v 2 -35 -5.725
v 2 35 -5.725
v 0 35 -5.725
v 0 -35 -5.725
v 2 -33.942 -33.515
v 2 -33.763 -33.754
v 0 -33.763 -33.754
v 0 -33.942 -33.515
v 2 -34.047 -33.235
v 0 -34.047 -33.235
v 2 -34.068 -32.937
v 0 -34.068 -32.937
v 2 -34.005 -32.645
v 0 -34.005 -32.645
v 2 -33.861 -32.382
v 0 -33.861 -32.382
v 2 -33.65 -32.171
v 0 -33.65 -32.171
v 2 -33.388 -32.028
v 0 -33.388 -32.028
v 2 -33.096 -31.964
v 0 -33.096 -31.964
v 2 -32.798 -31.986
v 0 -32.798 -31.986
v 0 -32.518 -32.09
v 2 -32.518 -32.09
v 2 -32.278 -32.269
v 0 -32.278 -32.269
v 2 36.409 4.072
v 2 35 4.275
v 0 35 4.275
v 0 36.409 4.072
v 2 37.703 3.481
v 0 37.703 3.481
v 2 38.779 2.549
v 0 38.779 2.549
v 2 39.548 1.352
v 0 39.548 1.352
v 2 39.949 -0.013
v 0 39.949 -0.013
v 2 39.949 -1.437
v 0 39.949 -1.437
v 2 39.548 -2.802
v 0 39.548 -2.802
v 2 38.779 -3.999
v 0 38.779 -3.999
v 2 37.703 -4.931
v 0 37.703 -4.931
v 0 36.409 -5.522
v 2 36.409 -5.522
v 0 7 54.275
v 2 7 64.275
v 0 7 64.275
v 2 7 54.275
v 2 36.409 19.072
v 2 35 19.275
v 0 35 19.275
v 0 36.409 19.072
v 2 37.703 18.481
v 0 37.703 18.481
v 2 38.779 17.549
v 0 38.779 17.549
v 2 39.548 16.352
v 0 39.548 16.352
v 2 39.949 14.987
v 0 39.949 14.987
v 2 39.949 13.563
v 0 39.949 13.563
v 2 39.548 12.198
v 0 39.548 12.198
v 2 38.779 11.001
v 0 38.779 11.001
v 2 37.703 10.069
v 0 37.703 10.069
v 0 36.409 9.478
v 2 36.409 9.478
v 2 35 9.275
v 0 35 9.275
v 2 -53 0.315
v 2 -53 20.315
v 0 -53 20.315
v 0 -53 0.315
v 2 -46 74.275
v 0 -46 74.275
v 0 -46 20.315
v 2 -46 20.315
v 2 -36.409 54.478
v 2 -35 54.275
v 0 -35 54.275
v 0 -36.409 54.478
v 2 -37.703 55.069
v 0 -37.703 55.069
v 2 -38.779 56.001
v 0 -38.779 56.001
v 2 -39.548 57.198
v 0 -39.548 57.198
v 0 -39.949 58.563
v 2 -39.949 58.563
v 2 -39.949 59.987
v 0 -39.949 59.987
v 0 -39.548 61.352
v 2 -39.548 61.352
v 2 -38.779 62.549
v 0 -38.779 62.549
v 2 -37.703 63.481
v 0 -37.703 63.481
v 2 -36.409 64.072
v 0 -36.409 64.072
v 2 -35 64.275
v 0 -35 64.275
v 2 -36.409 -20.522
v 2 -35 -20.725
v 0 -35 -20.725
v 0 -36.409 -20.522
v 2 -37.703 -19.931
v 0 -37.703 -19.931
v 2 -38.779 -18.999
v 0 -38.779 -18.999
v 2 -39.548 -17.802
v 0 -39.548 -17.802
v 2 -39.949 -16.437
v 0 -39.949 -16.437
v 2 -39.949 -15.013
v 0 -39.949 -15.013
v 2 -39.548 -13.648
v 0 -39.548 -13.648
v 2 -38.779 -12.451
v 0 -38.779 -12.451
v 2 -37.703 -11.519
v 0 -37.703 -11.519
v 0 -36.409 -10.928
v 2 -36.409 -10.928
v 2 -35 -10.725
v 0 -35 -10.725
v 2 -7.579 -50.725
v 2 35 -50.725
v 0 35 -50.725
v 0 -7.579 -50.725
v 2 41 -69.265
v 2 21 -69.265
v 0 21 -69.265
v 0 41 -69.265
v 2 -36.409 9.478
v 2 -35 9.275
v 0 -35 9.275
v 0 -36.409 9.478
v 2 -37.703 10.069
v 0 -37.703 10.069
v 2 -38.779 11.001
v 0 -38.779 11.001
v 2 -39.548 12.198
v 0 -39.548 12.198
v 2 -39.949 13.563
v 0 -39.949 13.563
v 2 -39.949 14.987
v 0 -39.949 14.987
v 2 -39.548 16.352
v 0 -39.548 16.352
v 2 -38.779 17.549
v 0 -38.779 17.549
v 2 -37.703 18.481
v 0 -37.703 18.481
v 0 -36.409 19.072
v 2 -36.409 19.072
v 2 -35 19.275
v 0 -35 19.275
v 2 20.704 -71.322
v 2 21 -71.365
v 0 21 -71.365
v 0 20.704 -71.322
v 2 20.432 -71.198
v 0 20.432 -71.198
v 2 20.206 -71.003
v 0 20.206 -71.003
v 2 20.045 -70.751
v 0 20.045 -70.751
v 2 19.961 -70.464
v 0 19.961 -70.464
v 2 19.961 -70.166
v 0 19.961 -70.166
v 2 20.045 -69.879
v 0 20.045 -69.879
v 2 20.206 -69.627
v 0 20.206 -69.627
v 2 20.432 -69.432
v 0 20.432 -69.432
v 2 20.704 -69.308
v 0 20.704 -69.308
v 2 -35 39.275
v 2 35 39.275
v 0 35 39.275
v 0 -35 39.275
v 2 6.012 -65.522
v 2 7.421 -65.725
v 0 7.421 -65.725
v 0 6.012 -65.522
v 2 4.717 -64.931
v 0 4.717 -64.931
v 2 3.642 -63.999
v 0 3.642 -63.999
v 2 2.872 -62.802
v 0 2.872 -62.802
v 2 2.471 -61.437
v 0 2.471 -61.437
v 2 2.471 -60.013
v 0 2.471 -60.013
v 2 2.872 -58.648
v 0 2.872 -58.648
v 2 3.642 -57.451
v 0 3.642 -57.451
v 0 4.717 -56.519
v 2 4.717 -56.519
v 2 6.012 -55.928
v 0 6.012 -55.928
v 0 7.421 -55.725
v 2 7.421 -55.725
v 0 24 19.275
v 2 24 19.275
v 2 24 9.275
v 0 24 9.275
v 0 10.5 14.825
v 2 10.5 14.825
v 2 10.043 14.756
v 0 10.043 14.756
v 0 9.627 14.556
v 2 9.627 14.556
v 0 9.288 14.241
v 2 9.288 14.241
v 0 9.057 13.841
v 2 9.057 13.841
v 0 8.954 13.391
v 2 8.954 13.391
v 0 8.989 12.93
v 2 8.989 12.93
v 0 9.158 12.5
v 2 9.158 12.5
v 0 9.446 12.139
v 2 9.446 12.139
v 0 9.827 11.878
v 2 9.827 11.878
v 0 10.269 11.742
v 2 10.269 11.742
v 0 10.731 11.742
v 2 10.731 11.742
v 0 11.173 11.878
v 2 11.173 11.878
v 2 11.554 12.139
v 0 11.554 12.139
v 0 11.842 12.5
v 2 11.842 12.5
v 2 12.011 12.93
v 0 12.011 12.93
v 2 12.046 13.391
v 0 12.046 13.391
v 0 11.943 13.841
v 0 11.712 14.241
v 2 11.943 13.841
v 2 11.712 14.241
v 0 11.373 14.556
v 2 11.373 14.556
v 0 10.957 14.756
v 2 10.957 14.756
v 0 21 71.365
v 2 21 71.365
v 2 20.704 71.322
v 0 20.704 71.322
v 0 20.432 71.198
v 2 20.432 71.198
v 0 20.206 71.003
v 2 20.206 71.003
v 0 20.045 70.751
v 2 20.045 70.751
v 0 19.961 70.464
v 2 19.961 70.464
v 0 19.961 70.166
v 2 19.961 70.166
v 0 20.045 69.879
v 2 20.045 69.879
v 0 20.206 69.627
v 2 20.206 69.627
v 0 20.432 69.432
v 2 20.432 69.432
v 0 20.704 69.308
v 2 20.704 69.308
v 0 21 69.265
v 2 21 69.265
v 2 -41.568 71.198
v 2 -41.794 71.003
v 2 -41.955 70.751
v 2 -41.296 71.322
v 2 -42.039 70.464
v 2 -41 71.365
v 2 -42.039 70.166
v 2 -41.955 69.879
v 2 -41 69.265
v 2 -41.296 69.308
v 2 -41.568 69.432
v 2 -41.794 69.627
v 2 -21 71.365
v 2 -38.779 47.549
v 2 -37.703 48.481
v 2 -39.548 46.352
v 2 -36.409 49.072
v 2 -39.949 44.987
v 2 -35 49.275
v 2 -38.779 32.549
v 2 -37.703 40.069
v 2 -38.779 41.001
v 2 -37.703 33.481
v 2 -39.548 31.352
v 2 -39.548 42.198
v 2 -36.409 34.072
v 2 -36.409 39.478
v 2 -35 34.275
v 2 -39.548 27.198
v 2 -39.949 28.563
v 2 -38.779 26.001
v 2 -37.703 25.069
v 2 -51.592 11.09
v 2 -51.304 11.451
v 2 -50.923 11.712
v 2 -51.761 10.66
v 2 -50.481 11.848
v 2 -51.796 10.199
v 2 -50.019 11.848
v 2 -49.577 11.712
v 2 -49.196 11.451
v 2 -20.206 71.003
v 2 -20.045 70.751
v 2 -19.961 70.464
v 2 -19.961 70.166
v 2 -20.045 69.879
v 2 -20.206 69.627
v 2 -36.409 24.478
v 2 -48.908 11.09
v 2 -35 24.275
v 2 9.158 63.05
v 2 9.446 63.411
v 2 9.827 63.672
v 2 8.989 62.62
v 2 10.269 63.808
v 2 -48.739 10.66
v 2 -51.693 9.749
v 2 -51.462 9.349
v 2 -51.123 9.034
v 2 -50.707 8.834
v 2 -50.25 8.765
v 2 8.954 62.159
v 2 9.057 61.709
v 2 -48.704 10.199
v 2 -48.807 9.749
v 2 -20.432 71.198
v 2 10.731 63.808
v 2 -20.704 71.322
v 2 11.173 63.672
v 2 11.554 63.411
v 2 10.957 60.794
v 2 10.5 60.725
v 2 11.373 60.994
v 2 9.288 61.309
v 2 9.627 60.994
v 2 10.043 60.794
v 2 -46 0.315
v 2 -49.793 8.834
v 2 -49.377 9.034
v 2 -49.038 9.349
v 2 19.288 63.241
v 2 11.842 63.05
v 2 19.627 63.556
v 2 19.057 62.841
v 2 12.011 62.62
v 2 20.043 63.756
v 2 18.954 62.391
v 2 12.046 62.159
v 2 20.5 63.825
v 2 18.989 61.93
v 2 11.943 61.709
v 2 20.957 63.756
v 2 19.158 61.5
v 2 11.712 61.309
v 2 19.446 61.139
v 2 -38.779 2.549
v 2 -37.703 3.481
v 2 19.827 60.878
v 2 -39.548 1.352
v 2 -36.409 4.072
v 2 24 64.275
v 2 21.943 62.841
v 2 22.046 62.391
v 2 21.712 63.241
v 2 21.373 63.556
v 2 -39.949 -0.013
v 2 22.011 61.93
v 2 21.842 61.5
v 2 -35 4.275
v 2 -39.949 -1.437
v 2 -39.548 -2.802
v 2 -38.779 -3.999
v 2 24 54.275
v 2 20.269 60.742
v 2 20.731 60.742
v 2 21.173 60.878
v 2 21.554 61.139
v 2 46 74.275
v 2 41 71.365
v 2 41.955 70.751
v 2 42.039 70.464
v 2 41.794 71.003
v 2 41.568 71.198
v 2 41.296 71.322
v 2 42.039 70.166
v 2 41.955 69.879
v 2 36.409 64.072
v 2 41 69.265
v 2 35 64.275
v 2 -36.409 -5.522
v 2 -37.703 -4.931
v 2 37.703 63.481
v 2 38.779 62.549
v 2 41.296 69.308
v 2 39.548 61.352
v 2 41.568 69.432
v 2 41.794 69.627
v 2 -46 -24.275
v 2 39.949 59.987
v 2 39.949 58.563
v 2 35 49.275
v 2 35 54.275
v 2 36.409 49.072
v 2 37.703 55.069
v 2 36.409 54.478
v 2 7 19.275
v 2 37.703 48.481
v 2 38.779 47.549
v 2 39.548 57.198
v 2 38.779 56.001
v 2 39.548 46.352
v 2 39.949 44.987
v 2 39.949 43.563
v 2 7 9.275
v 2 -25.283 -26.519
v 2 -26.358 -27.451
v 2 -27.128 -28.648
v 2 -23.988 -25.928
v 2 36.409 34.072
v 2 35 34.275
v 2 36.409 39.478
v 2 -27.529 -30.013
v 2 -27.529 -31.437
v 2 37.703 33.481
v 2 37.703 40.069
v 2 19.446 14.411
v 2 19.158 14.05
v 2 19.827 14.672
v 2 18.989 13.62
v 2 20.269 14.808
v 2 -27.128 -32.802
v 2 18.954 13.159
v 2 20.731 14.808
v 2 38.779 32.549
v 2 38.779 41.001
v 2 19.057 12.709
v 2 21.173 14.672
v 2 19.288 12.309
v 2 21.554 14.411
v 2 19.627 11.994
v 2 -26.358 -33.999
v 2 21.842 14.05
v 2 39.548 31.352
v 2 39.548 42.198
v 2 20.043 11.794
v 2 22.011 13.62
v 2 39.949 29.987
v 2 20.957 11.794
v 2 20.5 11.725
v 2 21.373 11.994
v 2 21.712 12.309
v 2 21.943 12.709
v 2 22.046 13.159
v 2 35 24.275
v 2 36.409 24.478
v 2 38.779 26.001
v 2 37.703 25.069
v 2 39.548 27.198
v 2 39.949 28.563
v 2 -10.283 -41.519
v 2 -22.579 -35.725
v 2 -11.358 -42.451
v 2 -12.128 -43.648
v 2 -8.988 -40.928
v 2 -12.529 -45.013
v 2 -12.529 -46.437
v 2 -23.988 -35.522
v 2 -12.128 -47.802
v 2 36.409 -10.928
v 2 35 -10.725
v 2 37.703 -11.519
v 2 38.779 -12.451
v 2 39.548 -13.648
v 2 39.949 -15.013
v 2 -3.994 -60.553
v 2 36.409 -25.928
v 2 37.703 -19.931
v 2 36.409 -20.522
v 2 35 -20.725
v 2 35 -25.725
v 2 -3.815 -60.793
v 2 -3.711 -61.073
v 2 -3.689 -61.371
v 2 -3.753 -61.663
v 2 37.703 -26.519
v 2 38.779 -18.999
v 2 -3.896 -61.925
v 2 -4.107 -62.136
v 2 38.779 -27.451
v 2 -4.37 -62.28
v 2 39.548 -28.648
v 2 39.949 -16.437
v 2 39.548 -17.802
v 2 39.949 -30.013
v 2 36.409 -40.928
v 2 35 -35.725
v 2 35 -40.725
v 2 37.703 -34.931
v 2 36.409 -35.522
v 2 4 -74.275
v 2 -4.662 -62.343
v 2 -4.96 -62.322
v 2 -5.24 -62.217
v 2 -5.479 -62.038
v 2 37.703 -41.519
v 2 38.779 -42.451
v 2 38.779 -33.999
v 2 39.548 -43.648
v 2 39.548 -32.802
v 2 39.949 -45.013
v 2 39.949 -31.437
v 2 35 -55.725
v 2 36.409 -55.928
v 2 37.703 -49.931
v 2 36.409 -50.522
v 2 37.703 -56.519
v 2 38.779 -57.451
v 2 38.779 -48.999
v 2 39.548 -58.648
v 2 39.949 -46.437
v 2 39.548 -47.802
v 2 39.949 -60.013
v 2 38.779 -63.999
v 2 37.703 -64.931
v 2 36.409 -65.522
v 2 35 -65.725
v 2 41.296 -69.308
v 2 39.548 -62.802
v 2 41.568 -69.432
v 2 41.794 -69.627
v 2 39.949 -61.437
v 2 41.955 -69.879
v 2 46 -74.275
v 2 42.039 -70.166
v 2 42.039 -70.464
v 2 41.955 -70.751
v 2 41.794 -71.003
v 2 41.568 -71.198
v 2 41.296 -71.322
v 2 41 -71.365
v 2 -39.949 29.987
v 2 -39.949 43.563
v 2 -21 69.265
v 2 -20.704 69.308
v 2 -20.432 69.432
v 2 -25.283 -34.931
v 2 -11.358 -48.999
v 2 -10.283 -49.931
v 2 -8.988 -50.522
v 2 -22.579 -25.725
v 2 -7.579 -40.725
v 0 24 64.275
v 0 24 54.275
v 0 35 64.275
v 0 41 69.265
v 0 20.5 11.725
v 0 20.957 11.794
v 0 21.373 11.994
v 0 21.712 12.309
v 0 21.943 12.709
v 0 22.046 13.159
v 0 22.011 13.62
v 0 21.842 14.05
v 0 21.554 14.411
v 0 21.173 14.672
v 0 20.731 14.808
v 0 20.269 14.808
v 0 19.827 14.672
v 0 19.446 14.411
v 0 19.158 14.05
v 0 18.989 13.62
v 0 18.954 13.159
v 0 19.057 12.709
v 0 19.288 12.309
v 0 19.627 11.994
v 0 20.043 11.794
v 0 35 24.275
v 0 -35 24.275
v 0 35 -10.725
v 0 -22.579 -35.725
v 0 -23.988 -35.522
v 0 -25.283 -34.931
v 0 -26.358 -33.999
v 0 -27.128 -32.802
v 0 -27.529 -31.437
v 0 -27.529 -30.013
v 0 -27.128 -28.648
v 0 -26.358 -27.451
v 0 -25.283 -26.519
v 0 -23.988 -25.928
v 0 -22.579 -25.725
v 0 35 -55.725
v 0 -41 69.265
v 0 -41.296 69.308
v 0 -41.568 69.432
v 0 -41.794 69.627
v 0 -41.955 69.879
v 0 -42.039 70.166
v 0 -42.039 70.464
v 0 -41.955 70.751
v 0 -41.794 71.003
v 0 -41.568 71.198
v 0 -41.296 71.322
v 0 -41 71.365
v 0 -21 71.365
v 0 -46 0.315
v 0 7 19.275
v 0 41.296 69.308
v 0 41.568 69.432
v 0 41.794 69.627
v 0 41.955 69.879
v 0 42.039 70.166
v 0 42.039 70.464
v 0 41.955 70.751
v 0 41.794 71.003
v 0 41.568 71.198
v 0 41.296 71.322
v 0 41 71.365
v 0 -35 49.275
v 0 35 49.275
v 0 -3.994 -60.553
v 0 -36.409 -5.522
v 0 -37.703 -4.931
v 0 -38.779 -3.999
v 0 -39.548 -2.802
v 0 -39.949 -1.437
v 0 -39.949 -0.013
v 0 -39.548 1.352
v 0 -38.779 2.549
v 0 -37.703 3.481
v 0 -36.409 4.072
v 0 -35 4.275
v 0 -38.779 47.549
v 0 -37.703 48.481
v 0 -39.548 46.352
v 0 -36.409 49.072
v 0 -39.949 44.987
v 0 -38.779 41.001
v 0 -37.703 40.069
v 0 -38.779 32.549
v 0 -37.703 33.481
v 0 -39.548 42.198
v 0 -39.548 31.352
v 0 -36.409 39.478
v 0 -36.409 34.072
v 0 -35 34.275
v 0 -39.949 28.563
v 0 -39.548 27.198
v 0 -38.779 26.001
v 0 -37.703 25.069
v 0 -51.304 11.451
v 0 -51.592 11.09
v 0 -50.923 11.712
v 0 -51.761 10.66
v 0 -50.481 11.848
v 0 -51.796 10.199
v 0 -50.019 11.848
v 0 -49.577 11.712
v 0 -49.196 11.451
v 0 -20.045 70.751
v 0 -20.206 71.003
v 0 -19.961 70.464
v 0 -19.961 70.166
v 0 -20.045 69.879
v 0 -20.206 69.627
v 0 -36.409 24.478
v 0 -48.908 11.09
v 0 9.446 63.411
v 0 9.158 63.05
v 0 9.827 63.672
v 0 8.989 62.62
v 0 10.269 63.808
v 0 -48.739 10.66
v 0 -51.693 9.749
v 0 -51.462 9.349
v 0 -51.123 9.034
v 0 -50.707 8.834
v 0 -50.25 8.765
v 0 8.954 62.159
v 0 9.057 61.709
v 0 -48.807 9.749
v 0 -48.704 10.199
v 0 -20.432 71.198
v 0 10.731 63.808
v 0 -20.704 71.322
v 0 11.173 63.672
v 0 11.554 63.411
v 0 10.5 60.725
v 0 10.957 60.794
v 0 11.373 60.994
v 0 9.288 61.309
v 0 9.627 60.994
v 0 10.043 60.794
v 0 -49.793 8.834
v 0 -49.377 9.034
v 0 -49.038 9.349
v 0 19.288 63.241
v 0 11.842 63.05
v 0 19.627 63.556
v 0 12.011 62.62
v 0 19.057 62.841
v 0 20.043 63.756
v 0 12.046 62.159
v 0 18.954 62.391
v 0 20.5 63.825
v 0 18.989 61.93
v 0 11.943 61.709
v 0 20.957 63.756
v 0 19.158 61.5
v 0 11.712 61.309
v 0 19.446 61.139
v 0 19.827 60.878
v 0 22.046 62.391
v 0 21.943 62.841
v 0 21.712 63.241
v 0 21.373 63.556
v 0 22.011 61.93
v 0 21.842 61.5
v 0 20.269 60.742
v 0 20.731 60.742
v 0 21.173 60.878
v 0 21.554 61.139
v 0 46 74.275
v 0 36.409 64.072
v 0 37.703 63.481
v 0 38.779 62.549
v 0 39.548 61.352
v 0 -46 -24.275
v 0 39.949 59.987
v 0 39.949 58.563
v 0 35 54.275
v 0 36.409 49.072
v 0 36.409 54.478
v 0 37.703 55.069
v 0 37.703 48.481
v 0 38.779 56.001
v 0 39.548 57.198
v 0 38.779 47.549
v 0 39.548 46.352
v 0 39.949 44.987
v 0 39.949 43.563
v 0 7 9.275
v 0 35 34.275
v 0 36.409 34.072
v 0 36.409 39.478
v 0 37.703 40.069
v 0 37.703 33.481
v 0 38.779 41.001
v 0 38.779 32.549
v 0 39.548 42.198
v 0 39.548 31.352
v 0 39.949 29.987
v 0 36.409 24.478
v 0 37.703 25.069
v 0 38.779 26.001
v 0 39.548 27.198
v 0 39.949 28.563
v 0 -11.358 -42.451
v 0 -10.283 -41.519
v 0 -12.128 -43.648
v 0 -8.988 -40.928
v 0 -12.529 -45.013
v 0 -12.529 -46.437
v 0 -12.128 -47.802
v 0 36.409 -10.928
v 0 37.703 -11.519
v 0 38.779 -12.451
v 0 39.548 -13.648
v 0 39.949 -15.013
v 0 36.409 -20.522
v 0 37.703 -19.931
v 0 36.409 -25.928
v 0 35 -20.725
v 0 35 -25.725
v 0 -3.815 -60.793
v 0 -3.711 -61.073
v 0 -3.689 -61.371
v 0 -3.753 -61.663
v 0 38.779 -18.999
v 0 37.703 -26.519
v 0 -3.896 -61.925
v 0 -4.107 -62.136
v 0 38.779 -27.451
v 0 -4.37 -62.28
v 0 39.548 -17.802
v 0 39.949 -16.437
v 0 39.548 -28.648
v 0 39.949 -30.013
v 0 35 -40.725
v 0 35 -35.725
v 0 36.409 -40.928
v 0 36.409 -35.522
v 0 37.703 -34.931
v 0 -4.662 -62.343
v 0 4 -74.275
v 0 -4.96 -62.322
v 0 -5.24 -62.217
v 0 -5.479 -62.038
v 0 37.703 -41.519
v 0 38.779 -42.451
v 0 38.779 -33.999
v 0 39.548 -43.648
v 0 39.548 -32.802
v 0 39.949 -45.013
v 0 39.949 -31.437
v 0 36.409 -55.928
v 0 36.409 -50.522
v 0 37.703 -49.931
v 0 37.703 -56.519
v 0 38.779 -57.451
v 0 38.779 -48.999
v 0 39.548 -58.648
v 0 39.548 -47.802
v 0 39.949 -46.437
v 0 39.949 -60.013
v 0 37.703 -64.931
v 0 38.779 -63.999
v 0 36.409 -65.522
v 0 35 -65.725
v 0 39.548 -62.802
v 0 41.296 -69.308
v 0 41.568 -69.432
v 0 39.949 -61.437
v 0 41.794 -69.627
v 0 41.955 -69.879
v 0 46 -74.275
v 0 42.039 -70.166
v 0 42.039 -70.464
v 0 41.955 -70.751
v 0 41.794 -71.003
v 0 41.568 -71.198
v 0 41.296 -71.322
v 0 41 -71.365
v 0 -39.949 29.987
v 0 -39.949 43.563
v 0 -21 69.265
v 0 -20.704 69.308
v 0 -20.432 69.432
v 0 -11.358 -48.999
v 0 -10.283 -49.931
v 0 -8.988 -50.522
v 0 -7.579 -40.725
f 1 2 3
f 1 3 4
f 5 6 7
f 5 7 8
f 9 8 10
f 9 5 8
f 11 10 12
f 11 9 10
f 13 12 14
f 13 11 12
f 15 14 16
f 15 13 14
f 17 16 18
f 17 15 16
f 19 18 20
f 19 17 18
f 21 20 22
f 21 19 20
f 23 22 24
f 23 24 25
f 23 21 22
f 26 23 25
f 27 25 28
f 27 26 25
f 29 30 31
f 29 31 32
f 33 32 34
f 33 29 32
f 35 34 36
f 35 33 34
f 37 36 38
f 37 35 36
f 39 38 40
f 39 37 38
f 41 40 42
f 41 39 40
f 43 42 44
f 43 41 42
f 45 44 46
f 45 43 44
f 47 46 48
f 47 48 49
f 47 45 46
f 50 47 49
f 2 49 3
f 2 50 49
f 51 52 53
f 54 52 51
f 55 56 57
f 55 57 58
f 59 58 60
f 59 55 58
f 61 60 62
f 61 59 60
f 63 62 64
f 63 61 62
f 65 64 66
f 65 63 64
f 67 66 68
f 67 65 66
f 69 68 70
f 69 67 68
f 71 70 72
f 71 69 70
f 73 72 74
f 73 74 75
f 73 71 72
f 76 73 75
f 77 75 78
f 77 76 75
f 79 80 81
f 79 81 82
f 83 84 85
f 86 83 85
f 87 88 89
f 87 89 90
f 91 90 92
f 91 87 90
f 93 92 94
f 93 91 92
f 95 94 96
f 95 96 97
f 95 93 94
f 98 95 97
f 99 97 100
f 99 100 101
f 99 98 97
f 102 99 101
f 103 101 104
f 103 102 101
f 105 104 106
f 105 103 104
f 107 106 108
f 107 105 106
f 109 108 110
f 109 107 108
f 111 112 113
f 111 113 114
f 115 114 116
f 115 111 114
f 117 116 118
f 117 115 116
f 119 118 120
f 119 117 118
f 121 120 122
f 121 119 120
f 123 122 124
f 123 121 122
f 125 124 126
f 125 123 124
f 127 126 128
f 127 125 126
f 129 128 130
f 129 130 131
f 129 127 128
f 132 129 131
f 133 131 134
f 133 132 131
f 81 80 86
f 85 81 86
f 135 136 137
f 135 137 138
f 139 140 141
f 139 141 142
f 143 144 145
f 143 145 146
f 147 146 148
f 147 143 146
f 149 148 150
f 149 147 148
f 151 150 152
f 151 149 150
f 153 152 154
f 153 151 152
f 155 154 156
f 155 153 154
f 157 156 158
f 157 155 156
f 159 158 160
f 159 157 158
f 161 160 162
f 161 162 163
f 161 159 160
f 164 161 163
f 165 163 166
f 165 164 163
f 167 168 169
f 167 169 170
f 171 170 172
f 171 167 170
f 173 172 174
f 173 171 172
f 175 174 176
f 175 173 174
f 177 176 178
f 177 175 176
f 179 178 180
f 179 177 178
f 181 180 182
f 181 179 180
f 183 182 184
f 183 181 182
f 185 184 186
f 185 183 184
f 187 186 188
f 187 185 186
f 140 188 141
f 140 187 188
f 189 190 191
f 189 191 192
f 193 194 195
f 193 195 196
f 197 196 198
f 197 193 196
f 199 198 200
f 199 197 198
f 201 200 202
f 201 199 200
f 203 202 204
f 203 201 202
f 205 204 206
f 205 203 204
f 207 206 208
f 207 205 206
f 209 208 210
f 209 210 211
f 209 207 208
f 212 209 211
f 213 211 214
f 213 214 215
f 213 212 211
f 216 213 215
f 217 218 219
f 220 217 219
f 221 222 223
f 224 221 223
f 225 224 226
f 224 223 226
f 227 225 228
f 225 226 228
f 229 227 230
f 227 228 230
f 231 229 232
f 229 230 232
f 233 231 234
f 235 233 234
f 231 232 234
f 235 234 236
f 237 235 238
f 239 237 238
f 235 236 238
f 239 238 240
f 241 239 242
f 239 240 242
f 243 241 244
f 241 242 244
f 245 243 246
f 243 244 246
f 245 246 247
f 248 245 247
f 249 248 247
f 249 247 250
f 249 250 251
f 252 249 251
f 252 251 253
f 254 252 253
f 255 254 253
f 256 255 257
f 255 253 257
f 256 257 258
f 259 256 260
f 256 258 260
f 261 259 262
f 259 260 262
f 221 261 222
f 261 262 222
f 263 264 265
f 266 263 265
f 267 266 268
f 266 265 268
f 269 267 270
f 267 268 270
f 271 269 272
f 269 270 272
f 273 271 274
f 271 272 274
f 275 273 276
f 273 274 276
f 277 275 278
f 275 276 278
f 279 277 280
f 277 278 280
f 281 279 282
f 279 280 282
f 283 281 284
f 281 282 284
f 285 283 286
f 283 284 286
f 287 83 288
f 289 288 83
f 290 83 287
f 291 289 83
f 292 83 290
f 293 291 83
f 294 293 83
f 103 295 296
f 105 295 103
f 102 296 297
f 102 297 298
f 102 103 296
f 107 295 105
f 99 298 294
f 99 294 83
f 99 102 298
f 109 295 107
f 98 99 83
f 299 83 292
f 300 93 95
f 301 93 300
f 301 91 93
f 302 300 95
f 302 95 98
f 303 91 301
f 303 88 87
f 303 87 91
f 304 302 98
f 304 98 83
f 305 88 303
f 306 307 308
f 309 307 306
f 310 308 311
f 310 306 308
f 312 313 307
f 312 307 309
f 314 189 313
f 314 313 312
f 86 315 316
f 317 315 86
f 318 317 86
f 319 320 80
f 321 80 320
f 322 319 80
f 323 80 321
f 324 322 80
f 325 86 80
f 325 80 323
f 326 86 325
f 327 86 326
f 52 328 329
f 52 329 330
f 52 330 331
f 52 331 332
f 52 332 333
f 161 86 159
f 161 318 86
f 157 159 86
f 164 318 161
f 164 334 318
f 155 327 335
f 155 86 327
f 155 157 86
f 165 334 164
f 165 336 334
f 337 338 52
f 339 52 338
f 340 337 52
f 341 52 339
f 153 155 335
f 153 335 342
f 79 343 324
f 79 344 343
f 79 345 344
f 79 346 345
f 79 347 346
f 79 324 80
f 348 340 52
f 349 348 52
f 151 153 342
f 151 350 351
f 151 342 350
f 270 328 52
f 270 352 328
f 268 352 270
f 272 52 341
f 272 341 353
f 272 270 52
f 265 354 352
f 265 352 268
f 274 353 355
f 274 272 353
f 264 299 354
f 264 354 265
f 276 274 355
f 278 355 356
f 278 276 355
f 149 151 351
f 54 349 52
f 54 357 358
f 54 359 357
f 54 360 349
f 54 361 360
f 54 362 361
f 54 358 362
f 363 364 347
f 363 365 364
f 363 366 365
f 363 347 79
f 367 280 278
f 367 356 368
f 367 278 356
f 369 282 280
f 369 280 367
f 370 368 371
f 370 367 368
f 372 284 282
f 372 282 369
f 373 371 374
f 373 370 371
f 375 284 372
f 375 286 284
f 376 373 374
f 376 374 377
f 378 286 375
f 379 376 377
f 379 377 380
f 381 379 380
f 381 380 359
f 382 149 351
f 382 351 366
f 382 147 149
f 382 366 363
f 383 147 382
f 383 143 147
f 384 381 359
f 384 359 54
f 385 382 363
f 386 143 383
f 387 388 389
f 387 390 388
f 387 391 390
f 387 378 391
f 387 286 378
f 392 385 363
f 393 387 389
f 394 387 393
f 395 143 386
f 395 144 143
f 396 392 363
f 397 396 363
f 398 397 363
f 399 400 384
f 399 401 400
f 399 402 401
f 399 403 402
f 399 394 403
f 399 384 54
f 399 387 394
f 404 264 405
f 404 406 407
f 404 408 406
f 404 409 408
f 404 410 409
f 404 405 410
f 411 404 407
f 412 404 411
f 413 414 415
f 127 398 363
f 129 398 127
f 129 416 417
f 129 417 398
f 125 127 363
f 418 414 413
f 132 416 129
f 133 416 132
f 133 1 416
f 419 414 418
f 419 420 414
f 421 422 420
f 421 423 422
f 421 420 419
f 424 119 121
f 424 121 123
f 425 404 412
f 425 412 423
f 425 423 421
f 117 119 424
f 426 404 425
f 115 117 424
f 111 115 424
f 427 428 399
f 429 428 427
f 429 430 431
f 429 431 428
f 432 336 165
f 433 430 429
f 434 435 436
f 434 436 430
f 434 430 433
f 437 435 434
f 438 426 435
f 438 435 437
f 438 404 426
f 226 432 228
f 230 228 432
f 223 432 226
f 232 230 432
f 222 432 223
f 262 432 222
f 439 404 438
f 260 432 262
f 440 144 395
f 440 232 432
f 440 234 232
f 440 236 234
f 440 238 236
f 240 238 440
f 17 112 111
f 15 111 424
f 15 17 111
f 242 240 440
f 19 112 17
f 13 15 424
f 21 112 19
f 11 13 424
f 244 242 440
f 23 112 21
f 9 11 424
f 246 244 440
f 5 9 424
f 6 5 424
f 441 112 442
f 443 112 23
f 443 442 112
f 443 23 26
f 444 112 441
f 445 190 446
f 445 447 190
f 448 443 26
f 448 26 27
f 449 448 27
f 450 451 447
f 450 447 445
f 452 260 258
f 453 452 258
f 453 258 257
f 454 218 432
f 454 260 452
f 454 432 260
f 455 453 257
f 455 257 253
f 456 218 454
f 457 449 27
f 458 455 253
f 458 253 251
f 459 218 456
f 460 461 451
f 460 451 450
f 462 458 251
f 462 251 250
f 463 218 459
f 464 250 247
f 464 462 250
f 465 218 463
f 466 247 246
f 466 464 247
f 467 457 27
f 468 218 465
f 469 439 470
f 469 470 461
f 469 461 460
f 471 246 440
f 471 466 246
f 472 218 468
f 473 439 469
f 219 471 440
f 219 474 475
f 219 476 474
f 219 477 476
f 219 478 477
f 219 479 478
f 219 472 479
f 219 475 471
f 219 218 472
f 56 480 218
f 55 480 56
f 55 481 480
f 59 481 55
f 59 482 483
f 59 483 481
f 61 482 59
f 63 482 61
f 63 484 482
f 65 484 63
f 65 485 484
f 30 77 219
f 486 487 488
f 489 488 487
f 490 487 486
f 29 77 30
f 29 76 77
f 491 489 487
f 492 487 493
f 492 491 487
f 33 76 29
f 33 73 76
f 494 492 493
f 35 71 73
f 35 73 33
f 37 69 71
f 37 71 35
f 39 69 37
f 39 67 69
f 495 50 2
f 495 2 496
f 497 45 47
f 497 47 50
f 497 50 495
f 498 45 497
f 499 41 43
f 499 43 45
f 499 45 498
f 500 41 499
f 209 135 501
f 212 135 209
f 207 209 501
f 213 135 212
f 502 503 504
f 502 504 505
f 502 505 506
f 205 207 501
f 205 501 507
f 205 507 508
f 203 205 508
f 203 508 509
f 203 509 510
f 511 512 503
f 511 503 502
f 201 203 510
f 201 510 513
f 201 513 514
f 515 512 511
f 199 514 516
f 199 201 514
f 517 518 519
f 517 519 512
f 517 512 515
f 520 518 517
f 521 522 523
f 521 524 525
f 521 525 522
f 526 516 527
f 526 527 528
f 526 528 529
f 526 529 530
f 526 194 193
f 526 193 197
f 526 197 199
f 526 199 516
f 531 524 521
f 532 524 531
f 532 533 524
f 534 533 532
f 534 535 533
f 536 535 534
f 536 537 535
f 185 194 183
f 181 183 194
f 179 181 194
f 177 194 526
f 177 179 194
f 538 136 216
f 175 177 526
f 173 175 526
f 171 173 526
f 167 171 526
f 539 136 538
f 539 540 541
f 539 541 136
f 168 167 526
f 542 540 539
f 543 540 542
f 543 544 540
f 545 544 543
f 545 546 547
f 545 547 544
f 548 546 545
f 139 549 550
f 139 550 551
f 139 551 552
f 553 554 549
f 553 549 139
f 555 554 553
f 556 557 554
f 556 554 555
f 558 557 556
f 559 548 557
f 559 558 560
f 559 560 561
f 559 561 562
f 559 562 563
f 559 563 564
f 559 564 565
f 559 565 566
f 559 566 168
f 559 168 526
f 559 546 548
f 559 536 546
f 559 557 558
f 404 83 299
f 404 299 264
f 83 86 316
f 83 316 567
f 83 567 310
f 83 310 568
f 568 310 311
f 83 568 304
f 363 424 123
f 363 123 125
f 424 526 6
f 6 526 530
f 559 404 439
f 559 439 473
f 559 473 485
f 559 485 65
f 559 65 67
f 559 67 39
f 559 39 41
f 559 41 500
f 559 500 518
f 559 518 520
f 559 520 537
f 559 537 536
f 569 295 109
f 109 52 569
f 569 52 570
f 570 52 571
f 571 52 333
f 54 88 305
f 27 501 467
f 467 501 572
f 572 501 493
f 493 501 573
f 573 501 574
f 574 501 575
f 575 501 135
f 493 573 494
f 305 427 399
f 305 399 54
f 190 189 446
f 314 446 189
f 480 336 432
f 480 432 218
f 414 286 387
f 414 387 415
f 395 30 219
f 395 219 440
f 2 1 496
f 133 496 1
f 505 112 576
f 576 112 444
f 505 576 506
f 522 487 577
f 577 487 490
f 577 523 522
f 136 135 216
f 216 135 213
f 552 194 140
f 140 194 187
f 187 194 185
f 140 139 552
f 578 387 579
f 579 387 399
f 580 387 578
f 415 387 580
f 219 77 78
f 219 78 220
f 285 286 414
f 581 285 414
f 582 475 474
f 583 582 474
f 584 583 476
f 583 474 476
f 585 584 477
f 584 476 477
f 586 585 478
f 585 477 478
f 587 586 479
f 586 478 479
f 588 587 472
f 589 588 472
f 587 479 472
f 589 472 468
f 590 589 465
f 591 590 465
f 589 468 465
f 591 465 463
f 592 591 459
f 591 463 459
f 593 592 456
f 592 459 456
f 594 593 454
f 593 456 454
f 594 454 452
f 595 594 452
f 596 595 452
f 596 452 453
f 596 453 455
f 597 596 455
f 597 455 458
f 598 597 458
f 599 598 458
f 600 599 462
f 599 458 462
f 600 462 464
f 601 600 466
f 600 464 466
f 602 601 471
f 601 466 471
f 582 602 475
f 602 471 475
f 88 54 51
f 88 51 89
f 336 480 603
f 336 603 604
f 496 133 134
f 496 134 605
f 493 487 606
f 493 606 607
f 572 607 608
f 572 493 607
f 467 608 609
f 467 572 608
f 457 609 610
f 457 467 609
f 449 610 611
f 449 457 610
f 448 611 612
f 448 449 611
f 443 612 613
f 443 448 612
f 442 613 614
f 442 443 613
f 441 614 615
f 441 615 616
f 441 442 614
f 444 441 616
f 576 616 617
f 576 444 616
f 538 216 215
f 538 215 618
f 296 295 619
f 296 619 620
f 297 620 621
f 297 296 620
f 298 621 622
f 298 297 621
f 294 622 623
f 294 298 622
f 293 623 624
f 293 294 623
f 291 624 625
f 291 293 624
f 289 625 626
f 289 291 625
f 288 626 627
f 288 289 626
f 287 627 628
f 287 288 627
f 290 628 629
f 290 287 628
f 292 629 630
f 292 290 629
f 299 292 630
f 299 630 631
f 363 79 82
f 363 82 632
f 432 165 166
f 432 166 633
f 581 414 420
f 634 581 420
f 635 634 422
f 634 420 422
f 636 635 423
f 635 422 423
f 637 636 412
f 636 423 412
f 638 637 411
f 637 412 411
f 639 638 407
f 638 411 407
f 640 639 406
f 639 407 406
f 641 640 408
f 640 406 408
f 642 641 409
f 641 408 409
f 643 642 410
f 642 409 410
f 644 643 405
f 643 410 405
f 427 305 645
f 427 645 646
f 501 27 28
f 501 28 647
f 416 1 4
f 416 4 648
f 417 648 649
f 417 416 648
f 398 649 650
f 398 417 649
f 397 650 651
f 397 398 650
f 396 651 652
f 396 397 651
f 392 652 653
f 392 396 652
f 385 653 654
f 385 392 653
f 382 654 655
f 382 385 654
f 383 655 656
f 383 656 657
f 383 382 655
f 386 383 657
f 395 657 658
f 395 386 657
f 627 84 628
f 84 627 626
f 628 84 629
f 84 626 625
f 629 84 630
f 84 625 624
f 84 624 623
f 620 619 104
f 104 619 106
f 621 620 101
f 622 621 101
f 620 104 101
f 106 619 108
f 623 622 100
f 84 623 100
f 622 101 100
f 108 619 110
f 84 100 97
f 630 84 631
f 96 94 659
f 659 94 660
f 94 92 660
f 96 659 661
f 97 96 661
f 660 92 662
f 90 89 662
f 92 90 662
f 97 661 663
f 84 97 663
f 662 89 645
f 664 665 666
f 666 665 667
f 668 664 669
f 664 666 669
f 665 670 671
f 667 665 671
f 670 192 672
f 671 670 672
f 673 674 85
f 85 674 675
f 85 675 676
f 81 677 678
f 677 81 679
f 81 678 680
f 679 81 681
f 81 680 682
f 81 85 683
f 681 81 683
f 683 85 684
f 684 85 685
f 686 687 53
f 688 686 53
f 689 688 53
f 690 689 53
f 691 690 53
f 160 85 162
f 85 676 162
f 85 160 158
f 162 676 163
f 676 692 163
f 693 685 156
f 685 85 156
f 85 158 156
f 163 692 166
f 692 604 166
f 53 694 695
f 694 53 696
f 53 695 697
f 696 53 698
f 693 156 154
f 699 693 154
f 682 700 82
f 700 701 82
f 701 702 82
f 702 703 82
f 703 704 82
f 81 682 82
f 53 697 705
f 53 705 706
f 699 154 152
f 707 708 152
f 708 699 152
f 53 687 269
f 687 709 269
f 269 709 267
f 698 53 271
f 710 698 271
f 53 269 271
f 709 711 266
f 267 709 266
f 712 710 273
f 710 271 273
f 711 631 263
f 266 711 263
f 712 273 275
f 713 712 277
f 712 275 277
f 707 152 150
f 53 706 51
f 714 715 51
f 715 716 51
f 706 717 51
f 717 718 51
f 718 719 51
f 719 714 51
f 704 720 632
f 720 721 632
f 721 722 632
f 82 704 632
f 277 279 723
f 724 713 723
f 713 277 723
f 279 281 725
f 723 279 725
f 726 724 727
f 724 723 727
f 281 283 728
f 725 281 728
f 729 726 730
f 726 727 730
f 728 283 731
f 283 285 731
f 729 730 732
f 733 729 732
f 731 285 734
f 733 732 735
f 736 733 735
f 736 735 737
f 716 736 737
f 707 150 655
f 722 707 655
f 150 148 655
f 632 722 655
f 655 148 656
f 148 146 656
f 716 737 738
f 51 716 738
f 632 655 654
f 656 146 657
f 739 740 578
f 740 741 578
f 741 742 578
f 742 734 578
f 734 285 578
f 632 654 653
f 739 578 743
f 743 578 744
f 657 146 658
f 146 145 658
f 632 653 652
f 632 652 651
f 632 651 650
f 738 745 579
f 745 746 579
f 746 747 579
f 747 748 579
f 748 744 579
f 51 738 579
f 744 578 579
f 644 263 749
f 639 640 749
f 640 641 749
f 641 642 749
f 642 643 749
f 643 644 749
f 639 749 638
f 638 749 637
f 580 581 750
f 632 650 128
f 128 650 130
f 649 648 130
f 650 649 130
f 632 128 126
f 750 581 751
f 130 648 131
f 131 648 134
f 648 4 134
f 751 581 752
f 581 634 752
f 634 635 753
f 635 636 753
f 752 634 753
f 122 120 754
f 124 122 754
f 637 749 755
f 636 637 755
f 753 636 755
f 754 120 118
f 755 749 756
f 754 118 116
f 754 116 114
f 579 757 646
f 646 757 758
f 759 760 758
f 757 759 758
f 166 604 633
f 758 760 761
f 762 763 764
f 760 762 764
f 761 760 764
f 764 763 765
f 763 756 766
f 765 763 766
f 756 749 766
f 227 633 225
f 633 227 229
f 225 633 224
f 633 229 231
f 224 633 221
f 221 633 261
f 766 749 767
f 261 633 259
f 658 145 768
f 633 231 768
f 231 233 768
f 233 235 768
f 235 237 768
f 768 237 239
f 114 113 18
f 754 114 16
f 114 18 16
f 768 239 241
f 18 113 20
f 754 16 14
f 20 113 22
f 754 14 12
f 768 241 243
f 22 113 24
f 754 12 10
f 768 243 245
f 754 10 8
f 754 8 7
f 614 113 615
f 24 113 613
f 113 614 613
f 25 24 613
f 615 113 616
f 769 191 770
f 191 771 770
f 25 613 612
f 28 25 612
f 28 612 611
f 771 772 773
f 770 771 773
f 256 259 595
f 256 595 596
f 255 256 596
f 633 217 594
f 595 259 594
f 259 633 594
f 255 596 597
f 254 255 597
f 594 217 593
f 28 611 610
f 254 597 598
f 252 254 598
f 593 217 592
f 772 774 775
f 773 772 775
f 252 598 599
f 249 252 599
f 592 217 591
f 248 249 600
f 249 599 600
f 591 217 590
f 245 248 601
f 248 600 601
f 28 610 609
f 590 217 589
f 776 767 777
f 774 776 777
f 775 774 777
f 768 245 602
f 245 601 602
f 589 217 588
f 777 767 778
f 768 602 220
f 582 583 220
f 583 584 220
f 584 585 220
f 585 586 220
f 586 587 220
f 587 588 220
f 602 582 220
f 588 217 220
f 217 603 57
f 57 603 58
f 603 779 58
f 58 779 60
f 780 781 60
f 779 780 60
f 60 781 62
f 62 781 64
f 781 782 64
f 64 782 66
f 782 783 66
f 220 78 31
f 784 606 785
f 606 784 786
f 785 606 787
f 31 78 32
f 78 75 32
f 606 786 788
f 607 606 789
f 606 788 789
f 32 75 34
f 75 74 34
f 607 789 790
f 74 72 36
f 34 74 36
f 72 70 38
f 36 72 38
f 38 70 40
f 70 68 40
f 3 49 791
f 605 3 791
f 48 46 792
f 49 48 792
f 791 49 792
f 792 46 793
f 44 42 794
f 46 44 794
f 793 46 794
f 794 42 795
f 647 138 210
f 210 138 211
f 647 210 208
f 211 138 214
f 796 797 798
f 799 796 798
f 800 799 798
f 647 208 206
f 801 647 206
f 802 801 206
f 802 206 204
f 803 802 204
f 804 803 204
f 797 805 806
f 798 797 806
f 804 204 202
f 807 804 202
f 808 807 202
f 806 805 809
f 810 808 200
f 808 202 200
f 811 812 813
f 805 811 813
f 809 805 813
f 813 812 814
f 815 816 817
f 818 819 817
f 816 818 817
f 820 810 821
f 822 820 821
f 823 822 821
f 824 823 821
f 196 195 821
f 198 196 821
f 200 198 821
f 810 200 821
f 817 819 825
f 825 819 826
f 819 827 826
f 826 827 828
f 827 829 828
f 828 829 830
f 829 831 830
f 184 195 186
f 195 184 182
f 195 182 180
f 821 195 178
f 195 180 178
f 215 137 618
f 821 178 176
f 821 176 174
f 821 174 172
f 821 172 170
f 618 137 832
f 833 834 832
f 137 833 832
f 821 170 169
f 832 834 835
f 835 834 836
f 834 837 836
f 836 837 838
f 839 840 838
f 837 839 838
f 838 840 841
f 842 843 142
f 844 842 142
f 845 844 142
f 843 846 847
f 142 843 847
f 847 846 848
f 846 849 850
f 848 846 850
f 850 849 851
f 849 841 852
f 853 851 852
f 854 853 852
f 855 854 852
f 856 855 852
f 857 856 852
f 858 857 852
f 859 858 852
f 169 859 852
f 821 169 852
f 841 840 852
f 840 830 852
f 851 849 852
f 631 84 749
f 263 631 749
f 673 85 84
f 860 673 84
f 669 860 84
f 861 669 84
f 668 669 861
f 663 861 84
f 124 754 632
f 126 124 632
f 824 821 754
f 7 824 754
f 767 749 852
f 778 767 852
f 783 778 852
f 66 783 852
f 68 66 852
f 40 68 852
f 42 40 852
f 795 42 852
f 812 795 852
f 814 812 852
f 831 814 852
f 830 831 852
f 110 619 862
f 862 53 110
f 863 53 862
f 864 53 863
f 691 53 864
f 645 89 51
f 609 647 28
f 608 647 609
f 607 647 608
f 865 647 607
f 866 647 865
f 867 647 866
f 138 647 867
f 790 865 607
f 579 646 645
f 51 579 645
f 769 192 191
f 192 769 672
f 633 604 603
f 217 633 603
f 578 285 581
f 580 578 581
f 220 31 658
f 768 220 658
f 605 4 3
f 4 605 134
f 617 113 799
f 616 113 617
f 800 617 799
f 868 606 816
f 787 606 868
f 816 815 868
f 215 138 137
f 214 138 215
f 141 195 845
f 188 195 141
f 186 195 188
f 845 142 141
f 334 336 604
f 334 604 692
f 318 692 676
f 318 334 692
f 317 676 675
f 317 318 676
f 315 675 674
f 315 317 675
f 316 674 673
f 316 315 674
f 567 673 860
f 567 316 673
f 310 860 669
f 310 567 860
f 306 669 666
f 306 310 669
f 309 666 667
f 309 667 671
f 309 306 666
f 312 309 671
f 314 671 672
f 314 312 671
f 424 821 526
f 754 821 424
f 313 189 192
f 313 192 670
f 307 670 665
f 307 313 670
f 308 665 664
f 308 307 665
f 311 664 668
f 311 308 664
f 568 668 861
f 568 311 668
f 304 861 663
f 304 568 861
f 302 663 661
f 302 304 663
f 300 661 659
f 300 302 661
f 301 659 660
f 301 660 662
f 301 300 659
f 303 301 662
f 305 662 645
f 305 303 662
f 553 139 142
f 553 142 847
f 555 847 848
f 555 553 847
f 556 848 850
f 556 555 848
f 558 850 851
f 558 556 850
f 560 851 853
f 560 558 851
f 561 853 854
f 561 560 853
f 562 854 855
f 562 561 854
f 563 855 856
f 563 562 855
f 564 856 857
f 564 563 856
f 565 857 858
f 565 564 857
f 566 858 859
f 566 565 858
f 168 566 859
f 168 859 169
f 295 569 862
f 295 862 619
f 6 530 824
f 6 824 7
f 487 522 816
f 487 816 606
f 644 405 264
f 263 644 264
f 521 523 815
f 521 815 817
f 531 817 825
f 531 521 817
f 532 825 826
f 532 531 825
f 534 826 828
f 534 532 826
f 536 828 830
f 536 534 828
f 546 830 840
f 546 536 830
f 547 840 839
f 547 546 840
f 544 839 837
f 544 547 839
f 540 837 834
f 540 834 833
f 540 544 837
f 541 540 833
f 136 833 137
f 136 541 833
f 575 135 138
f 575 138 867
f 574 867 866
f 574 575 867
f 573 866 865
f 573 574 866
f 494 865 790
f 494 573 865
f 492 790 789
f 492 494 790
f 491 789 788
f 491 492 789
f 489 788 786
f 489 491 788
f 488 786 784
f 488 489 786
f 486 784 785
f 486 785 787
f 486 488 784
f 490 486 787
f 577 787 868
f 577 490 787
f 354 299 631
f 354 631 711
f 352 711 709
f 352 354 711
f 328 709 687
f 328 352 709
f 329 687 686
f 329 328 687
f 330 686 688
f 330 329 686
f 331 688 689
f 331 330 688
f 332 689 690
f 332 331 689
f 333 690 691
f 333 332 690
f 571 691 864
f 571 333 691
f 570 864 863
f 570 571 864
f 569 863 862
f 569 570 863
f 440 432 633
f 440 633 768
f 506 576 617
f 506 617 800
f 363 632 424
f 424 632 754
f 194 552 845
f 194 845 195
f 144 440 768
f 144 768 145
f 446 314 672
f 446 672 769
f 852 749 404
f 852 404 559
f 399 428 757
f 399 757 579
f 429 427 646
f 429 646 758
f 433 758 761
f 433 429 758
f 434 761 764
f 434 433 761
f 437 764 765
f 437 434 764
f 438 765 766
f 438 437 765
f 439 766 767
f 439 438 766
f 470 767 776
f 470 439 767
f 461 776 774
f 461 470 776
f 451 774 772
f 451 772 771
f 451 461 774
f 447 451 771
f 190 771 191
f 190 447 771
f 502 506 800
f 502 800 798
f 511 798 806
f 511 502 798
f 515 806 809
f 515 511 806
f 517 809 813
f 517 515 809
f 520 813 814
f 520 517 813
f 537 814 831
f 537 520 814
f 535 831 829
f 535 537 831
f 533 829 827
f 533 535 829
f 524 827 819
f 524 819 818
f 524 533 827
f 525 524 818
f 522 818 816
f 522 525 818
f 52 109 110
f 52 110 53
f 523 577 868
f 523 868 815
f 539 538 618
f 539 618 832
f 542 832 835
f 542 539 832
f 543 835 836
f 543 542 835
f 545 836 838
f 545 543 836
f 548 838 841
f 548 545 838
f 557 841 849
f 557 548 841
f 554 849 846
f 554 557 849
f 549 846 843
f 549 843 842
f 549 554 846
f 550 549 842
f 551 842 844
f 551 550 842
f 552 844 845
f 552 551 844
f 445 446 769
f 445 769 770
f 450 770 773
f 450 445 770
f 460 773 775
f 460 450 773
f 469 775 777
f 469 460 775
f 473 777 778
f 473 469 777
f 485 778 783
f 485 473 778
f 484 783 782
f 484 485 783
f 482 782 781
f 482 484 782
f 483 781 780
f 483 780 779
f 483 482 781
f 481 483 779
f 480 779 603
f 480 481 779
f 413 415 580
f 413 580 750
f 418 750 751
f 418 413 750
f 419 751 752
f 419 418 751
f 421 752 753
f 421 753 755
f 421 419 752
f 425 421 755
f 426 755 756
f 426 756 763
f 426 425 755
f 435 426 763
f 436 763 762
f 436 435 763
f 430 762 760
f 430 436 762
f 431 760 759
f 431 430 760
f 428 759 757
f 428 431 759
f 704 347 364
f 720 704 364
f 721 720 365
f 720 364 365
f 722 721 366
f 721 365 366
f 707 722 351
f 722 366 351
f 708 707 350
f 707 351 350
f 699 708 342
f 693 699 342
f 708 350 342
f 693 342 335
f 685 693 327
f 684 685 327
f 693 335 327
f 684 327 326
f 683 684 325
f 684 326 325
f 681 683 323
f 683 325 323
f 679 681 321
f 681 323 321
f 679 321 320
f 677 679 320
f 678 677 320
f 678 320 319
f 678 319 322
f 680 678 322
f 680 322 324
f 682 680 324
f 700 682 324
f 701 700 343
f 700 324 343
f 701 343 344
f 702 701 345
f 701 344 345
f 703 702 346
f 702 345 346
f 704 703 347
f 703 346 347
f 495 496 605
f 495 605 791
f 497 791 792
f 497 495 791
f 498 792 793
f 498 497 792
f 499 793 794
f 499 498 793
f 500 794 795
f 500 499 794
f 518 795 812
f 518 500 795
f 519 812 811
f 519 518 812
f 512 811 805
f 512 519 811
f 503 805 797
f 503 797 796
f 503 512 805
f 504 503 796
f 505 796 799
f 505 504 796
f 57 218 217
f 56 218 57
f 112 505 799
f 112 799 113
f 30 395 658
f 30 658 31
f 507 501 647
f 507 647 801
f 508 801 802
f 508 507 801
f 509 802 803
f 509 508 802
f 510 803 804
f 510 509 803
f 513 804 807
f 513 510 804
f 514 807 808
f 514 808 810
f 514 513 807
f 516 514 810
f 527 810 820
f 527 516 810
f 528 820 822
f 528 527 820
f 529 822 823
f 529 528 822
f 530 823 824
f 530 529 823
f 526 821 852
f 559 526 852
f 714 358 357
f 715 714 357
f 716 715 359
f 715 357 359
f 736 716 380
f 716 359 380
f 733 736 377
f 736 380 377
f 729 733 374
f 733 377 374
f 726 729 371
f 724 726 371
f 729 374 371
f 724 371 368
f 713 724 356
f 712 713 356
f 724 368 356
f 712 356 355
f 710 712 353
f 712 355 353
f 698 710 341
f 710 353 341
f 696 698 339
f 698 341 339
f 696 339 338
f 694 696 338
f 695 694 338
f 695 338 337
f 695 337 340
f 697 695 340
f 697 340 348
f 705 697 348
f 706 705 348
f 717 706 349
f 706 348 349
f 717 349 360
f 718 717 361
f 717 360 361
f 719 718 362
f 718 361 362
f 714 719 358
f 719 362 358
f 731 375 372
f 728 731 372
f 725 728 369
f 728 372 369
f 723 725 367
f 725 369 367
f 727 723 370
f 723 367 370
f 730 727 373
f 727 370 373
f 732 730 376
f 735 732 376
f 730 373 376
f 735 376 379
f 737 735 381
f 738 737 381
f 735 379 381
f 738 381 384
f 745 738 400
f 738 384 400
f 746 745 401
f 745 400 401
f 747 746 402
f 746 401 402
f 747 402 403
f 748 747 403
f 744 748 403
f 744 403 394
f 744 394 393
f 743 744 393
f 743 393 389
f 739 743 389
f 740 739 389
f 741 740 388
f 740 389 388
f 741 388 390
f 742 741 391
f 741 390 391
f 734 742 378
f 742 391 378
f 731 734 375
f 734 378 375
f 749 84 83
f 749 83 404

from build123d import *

# Parameters (mm, degrees)
SKETCH_2_W               = 148.55
SKETCH_2_H               = 92
EXTRUDE_1_DEPTH          = 2
CUT_EXTRUDE_1_DEPTH      = 88.388647003
CUT_EXTRUDE_1_DEPTH_BACK = 2
CUT_EXTRUDE_2_DEPTH      = 2
SKETCH_5_W               = 20
SKETCH_5_H               = 7
SKETCH_5_R               = 1.55
EXTRUDE_2_DEPTH          = 2
CUT_EXTRUDE_3_DEPTH      = 2
SKETCH_8_W               = 10
SKETCH_8_H               = 17
EXTRUDE_3_DEPTH          = 2
SKETCH_7_R               = 1.55
CUT_EXTRUDE_4_DEPTH      = 2
CUT_EXTRUDE_5_DEPTH      = 2


with BuildPart() as part:
    # 草图2 → 凸台-拉伸1 (new body)
    with BuildSketch(Plane(origin=(0, 0, 0), x_dir=(0, 0, -1), z_dir=(1, 0, 0))):
        Rectangle(SKETCH_2_W, SKETCH_2_H)
    extrude(amount=EXTRUDE_1_DEPTH)

    # 草图3 → 切除-拉伸1 (cut, two sides: drawn at the far end of the back side and taken through both)
    with BuildSketch(Plane(origin=(2, 0, 0), x_dir=(0, 0, -1), z_dir=(1, 0, 0)).offset(-CUT_EXTRUDE_1_DEPTH_BACK)):
        Polygon((-204.458434938, -274.733434938), (24.275, -46), (74.275, 4), (303.008434938, 232.733434938), (760.475304814, -224.733434938), (253.008434938, -732.200304814), align=None)
    extrude(amount=CUT_EXTRUDE_1_DEPTH + CUT_EXTRUDE_1_DEPTH_BACK, mode=Mode.SUBTRACT)

    # 草图4 → 切除-拉伸2 (cut)
    with BuildSketch(Plane(origin=(2, 0, 0), x_dir=(0, 0, -1), z_dir=(1, 0, 0))):
        with BuildLine():
            Line((-71.365, -41), (-71.365, -21))
            ThreePointArc((-71.365, -21), (-70.315, -19.95), (-69.265, -21))
            Line((-69.265, -21), (-69.265, -41))
            ThreePointArc((-69.265, -41), (-70.315, -42.05), (-71.365, -41))
        make_face()
        with BuildLine():
            Line((-71.365, 41), (-71.365, 21))
            ThreePointArc((-71.365, 21), (-70.315, 19.95), (-69.265, 21))
            Line((-69.265, 21), (-69.265, 41))
            ThreePointArc((-69.265, 41), (-70.315, 42.05), (-71.365, 41))
        make_face()
        with BuildLine():
            Line((71.365, 41), (71.365, 21))
            ThreePointArc((71.365, 21), (70.315, 19.95), (69.265, 21))
            Line((69.265, 21), (69.265, 41))
            ThreePointArc((69.265, 41), (70.315, 42.05), (71.365, 41))
        make_face()
    extrude(amount=-CUT_EXTRUDE_2_DEPTH, mode=Mode.SUBTRACT)

    # 草图5 → 凸台-拉伸2 (add)
    with BuildSketch(Plane(origin=(2, 0, 0), x_dir=(0, 0, -1), z_dir=(1, 0, 0))):
        with Locations((-10.315, -49.5)):
            Rectangle(SKETCH_5_W, SKETCH_5_H)
        with Locations((-10.315, -50.25)):
            Circle(SKETCH_5_R, mode=Mode.SUBTRACT)
    extrude(amount=-EXTRUDE_2_DEPTH)

    # 草图6 → 切除-拉伸3 (cut)
    with BuildSketch(Plane(origin=(2, 0, 0), x_dir=(0, 0, -1), z_dir=(1, 0, 0))):
        with BuildLine():
            Line((-64.275, -35), (-64.275, 35))
            ThreePointArc((-64.275, 35), (-59.275, 40), (-54.275, 35))
            Line((-54.275, 35), (-54.275, -35))
            ThreePointArc((-54.275, -35), (-59.275, -40), (-64.275, -35))
        make_face()
        with BuildLine():
            Line((-49.275, -35), (-49.275, 35))
            ThreePointArc((-49.275, 35), (-44.275, 40), (-39.275, 35))
            Line((-39.275, 35), (-39.275, -35))
            ThreePointArc((-39.275, -35), (-44.275, -40), (-49.275, -35))
        make_face()
        with BuildLine():
            Line((-34.275, -35), (-34.275, 35))
            ThreePointArc((-34.275, 35), (-29.275, 40), (-24.275, 35))
            Line((-24.275, 35), (-24.275, -35))
            ThreePointArc((-24.275, -35), (-29.275, -40), (-34.275, -35))
        make_face()
        with BuildLine():
            Line((-19.275, -35), (-19.275, 35))
            ThreePointArc((-19.275, 35), (-14.275, 40), (-9.275, 35))
            Line((-9.275, 35), (-9.275, -35))
            ThreePointArc((-9.275, -35), (-14.275, -40), (-19.275, -35))
        make_face()
        with BuildLine():
            Line((-4.275, -35), (-4.275, 35))
            ThreePointArc((-4.275, 35), (0.725, 40), (5.725, 35))
            Line((5.725, 35), (5.725, -35))
            ThreePointArc((5.725, -35), (0.725, -40), (-4.275, -35))
        make_face()
        with BuildLine():
            Line((10.725, -35), (10.725, 35))
            ThreePointArc((10.725, 35), (15.725, 40), (20.725, 35))
            Line((20.725, 35), (20.725, -35))
            ThreePointArc((20.725, -35), (15.725, -40), (10.725, -35))
        make_face()
        with BuildLine():
            Line((25.725, -22.579437252), (25.725, 35))
            ThreePointArc((25.725, 35), (30.725, 40), (35.725, 35))
            Line((35.725, 35), (35.725, -22.579437252))
            ThreePointArc((35.725, -22.579437252), (30.725, -27.579437252), (25.725, -22.579437252))
        make_face()
        with BuildLine():
            Line((40.725, -7.579437252), (40.725, 35))
            ThreePointArc((40.725, 35), (45.725, 40), (50.725, 35))
            Line((50.725, 35), (50.725, -7.579437252))
            ThreePointArc((50.725, -7.579437252), (45.725, -12.579437252), (40.725, -7.579437252))
        make_face()
        with BuildLine():
            Line((55.725, 7.420562748), (55.725, 35))
            ThreePointArc((55.725, 35), (60.725, 40), (65.725, 35))
            Line((65.725, 35), (65.725, 7.420562748))
            ThreePointArc((65.725, 7.420562748), (60.725, 2.420562748), (55.725, 7.420562748))
        make_face()
    extrude(amount=-CUT_EXTRUDE_3_DEPTH, mode=Mode.SUBTRACT)

    # 草图8 → 凸台-拉伸3 (add)
    with BuildSketch(Plane(origin=(2, 0, 0), x_dir=(0, 0, -1), z_dir=(1, 0, 0))):
        with Locations((-59.275, 15.5)):
            Rectangle(SKETCH_8_W, SKETCH_8_H)
        with Locations((-14.275, 15.5)):
            Rectangle(SKETCH_8_W, SKETCH_8_H)
    extrude(amount=-EXTRUDE_3_DEPTH)

    # 草图7 → 切除-拉伸4 (cut)
    with BuildSketch(Plane(origin=(2, 0, 0), x_dir=(0, 0, -1), z_dir=(1, 0, 0))):
        with Locations((-62.275, 10.5)):
            Circle(SKETCH_7_R)
        with Locations(Location((-13.275, 10.5, 0), (0, 0, 180))):
            Circle(SKETCH_7_R)
        with Locations((-13.275, 20.5)):
            Circle(SKETCH_7_R)
        with Locations(Location((-62.275, 20.5, 0), (0, 0, 180))):
            Circle(SKETCH_7_R)
    extrude(amount=-CUT_EXTRUDE_4_DEPTH, mode=Mode.SUBTRACT)

    # 草图9 → 切除-拉伸5 (cut)
    with BuildSketch(Plane(origin=(2, 0, 0), x_dir=(0, 0, -1), z_dir=(1, 0, 0))):
        with BuildLine():
            Line((32.269081912, -32.27835316), (60.55335316, -3.994081912))
            ThreePointArc((60.55335316, -3.994081912), (62.0382774, -3.994081912), (62.0382774, -5.479006153))
            Line((62.0382774, -5.479006153), (33.754006153, -33.7632774))
            ThreePointArc((33.754006153, -33.7632774), (32.269081912, -33.7632774), (32.269081912, -32.27835316))
        make_face()
    extrude(amount=-CUT_EXTRUDE_5_DEPTH, mode=Mode.SUBTRACT)


solid = part.part
